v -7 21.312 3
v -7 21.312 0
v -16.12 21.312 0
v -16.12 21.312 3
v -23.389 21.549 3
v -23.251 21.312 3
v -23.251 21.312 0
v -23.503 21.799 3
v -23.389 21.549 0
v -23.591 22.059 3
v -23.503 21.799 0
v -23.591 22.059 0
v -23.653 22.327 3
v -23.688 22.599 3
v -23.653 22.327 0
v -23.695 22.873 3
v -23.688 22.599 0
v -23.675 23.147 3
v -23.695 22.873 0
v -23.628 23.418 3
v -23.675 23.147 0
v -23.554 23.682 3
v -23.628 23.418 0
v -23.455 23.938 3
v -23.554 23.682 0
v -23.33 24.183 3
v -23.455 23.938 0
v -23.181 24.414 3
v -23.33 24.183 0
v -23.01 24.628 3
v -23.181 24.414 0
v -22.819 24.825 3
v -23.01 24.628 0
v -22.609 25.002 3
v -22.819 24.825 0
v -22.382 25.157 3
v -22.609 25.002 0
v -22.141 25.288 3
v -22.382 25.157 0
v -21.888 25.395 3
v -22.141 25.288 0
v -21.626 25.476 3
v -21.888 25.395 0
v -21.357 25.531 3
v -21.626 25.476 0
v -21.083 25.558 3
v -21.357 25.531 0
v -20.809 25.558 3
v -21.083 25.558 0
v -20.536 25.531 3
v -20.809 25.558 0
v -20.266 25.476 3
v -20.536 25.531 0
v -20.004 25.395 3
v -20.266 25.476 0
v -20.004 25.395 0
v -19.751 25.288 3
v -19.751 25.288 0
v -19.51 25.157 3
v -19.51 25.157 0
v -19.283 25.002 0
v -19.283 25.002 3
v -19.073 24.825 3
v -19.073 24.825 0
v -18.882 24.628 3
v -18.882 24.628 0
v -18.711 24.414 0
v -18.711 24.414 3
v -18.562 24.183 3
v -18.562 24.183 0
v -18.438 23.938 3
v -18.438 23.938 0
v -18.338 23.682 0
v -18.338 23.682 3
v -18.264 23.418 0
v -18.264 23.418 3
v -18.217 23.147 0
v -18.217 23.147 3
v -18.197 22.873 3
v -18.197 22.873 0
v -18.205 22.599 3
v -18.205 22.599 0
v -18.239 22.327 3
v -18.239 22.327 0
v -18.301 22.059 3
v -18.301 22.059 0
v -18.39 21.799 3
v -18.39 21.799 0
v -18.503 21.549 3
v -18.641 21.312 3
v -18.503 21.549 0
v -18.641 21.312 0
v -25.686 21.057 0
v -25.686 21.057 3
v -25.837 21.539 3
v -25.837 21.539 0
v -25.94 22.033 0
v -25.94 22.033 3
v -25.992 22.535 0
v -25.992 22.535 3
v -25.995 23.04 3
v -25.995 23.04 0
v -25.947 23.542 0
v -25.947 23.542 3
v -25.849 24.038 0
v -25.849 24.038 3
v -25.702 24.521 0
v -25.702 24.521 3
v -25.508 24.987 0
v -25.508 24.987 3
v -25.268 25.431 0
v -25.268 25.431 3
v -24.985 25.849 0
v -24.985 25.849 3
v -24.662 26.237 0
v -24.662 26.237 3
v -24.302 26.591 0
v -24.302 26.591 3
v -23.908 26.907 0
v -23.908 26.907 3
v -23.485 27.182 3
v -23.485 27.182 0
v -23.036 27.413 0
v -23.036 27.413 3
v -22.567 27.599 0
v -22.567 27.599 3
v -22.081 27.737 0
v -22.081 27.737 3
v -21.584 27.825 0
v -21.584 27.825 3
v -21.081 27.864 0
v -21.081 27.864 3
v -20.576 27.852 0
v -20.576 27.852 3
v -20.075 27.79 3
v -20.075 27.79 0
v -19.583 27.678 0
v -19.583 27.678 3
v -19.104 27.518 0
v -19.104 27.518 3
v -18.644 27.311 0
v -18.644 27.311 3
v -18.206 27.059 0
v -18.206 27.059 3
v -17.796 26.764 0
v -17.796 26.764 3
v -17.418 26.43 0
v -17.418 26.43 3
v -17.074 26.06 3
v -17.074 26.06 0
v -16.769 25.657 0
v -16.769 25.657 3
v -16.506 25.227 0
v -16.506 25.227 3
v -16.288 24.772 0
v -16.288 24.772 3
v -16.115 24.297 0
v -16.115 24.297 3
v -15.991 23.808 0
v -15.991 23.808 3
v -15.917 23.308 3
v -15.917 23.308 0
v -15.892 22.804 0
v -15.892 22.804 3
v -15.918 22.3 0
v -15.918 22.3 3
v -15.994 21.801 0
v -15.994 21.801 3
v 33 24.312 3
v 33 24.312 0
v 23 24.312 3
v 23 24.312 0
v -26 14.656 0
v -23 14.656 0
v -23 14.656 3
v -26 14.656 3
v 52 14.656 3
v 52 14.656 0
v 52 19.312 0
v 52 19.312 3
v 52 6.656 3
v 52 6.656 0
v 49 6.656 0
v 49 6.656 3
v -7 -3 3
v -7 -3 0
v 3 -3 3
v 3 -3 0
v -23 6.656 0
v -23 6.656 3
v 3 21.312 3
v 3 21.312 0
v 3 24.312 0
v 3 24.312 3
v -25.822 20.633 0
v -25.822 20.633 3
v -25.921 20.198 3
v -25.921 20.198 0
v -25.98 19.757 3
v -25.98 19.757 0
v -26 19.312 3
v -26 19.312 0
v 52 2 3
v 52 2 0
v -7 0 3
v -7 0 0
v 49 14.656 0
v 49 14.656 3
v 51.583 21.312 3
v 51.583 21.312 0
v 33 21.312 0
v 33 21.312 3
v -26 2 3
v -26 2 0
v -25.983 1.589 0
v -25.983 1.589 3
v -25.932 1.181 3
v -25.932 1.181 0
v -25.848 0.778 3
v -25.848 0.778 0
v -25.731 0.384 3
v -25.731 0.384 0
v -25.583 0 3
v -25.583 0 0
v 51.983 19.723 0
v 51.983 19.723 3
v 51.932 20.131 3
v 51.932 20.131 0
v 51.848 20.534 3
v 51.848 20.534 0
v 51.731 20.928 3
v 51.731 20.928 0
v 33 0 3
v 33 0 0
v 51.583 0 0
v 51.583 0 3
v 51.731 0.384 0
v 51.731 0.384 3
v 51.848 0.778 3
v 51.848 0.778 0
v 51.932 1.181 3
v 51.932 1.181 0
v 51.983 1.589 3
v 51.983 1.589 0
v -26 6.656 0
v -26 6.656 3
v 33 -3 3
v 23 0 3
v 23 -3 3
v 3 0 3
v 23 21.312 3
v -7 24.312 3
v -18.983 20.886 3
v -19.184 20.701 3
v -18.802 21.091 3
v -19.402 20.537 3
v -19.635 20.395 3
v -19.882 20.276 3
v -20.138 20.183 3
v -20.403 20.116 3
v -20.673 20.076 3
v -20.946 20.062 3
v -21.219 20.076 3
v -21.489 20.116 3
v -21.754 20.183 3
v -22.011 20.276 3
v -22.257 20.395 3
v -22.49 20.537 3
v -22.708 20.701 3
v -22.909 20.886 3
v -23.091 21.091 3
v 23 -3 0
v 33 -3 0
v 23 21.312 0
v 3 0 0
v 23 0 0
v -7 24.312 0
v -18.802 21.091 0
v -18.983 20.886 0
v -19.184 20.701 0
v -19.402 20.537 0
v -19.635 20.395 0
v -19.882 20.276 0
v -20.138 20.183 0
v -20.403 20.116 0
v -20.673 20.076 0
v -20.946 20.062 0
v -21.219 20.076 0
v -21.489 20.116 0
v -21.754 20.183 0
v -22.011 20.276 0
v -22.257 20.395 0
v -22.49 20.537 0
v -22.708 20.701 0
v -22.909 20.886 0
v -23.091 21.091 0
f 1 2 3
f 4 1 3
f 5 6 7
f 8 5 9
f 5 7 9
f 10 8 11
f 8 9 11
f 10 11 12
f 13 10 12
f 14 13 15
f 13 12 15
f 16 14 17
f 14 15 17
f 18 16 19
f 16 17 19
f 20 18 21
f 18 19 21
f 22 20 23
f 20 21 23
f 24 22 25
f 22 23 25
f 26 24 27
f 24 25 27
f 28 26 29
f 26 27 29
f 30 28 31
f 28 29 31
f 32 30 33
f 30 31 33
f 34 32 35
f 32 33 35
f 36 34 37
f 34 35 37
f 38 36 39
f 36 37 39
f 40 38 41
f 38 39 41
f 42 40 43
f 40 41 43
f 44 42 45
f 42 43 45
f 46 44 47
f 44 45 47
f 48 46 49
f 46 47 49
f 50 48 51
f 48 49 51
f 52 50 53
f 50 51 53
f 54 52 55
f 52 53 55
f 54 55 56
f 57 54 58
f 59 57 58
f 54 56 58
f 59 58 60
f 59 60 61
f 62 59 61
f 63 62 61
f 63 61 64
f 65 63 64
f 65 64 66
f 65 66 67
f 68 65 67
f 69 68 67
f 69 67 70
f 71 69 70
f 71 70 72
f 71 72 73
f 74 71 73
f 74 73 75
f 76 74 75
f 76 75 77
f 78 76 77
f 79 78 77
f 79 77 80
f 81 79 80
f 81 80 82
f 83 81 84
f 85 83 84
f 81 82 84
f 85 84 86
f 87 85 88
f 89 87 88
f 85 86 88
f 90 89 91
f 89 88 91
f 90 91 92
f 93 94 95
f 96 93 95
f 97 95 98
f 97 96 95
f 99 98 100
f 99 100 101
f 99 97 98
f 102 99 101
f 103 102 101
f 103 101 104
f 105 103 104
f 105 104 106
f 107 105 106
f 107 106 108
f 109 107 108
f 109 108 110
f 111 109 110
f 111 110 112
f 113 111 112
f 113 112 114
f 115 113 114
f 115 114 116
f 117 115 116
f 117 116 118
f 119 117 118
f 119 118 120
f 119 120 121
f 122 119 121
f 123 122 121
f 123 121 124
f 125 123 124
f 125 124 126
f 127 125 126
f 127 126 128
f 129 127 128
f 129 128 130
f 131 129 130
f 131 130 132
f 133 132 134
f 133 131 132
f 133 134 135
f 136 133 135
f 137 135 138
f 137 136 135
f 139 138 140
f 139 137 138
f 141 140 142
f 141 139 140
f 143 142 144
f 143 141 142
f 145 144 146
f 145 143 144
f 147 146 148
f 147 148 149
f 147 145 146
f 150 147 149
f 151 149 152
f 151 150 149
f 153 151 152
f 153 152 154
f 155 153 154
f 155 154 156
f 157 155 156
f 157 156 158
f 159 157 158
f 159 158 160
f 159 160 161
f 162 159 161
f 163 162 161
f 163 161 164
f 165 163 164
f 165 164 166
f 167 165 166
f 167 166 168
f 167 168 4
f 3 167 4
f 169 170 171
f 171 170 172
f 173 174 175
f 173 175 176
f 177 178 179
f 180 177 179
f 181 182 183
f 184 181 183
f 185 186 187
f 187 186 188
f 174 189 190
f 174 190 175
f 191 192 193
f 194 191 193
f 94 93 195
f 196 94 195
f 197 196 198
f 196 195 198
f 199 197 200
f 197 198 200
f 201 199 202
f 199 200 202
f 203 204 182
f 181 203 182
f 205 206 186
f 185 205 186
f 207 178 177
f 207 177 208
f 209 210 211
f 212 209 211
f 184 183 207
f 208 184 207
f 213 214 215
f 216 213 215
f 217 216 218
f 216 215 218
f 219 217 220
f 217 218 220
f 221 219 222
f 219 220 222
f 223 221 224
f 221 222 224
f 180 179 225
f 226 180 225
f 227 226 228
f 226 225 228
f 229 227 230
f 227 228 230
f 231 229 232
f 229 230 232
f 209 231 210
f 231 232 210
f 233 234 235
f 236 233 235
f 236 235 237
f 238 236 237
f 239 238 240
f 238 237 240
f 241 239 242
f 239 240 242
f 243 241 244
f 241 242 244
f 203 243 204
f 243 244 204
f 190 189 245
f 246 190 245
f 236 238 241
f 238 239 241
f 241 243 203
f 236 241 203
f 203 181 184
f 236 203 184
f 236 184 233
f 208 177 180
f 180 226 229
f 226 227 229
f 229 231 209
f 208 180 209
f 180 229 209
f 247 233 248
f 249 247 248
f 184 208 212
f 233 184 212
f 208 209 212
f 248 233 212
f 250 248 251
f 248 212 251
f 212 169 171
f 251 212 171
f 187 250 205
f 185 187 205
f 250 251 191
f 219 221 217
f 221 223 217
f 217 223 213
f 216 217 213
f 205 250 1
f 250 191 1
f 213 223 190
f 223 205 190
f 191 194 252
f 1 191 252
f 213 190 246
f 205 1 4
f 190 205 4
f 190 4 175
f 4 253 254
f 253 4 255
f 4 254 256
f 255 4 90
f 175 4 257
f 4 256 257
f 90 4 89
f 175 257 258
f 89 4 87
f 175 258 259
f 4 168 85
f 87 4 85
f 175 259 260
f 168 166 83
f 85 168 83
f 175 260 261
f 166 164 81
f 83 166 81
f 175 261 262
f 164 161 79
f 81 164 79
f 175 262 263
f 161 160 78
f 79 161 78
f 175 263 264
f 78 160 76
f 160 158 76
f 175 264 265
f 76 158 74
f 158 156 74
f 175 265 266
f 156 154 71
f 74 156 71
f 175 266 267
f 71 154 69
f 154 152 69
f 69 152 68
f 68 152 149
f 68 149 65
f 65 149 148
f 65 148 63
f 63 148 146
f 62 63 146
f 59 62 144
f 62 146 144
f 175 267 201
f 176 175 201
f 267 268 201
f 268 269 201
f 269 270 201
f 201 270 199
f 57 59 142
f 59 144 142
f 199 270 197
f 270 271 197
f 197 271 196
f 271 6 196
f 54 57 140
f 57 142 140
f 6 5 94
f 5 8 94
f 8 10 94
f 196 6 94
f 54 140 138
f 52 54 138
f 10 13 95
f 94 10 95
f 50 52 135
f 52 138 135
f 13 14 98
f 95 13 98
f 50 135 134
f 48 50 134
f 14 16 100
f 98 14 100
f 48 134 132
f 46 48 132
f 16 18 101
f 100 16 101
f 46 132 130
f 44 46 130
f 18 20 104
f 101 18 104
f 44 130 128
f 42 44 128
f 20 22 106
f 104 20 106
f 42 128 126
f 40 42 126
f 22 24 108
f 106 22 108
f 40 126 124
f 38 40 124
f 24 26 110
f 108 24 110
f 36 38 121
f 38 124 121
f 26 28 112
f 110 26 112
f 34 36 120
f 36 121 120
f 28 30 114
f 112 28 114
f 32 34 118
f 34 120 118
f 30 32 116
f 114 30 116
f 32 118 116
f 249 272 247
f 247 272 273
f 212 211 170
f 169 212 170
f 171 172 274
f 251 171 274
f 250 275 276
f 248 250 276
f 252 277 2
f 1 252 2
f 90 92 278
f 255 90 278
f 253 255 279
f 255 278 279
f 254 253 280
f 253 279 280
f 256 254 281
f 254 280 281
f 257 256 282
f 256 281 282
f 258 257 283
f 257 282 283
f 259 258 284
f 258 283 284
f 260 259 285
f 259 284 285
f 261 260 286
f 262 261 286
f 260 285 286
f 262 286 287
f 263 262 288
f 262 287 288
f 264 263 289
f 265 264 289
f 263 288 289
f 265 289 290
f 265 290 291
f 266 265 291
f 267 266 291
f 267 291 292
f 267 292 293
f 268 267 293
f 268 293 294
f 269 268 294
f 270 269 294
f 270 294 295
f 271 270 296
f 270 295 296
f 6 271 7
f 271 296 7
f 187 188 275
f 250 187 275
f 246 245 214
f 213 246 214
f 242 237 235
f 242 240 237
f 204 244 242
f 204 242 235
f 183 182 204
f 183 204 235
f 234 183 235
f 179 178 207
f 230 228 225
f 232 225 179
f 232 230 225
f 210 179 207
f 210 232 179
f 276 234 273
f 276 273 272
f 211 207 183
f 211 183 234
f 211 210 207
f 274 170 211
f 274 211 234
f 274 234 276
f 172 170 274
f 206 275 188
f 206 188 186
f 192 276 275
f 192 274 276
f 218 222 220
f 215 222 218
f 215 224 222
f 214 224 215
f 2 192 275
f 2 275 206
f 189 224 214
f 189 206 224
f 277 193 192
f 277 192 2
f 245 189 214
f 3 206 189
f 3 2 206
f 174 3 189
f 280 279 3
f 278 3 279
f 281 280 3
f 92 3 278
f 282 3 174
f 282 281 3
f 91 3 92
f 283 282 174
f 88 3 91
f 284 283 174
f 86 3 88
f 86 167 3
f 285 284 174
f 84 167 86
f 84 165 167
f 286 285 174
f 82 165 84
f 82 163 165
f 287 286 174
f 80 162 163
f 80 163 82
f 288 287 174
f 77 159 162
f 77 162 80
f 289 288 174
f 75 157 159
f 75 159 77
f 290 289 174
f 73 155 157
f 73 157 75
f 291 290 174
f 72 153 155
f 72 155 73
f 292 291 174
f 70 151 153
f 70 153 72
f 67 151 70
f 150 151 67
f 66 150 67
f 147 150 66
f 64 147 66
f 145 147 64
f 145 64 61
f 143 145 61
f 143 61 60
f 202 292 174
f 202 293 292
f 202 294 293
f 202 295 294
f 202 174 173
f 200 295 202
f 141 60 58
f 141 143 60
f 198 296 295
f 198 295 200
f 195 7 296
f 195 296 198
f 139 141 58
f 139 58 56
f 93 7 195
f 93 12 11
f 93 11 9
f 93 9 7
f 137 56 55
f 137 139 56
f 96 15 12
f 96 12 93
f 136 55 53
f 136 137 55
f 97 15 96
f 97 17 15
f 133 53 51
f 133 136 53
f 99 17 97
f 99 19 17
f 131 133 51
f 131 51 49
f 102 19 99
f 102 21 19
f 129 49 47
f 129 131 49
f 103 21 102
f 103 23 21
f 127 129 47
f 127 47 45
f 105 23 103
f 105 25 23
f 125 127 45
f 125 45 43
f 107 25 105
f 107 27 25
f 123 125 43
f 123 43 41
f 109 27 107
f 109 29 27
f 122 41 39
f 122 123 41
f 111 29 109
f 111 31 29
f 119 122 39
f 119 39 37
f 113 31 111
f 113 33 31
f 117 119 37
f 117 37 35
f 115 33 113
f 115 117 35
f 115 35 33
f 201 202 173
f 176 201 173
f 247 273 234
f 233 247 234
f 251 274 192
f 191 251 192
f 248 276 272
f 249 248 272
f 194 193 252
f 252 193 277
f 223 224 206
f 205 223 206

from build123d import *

# Parameters (mm, degrees)
BOSS_EXTRUDE1_DEPTH = 3
SKETCH3_R           = 5.053902861
SKETCH3_R_2         = 2.749769833
BOSS_EXTRUDE3_DEPTH = 3
CUT_EXTRUDE1_DEPTH  = 3
SKETCH5_W           = 3
SKETCH5_H           = 8
CUT_EXTRUDE2_DEPTH  = 3


with BuildPart() as part:
    # Sketch1 → Boss-Extrude1 (new body)
    with BuildSketch(Plane.XY):
        with BuildLine():
            Line((-7, -3), (3, -3))
            Line((3, -3), (3, 0))
            Line((3, 0), (23, 0))
            Line((23, 0), (23, -3))
            Line((23, -3), (33, -3))
            Line((33, -3), (33, 0))
            Line((33, 0), (51.582575695, 0))
            ThreePointArc((51.582575695, 0), (51.894531565, 0.978451782), (52, 2))
            Line((52, 2), (52, 19.311841589))
            ThreePointArc((52, 19.311841589), (51.894531565, 20.333389808), (51.582575695, 21.311841589))
            Line((51.582575695, 21.311841589), (33, 21.311841589))
            Line((33, 21.311841589), (33, 24.311841589))
            Line((33, 24.311841589), (23, 24.311841589))
            Line((23, 24.311841589), (23, 21.311841589))
            Line((23, 21.311841589), (3, 21.311841589))
            Line((3, 21.311841589), (3, 24.311841589))
            Line((3, 24.311841589), (-7, 24.311841589))
            Line((-7, 24.311841589), (-7, 21.311841589))
            Line((-7, 21.311841589), (-25.582575695, 21.311841589))
            ThreePointArc((-25.582575695, 21.311841589), (-25.894531565, 20.333389808), (-26, 19.311841589))
            Line((-26, 19.311841589), (-26, 2))
            ThreePointArc((-26, 2), (-25.894531565, 0.978451782), (-25.582575695, 0))
            Line((-25.582575695, 0), (-7, 0))
            Line((-7, 0), (-7, -3))
        make_face()
    extrude(amount=BOSS_EXTRUDE1_DEPTH)

    # Sketch3 → Boss-Extrude3 (add)
    with BuildSketch(Plane(origin=(0, 0, 0), x_dir=(-1, 0, 0), z_dir=(0, 0, -1))):
        with Locations((20.946097139, 22.811841589)):
            Circle(SKETCH3_R)
        with Locations((20.946097139, 22.811841589)):
            Circle(SKETCH3_R_2, mode=Mode.SUBTRACT)
    extrude(amount=-BOSS_EXTRUDE3_DEPTH)

    # Sketch4 → Cut-Extrude1 (cut)
    with BuildSketch(Plane(origin=(0, 0, 0), x_dir=(-1, 0, 0), z_dir=(0, 0, -1))):
        with BuildLine():
            Line((23.250708633, 21.311841589), (18.641485645, 21.311841589))
            ThreePointArc((18.641485645, 21.311841589), (20.946097139, 20.062071756), (23.250708633, 21.311841589))
        make_face()
    extrude(amount=-CUT_EXTRUDE1_DEPTH, mode=Mode.SUBTRACT)

    # Sketch5 → Cut-Extrude2 (cut)
    with BuildSketch(Plane(origin=(0, 0, 0), x_dir=(-1, 0, 0), z_dir=(0, 0, -1))):
        with Locations((24.5, 10.655920795)):
            Rectangle(SKETCH5_W, SKETCH5_H)
        with Locations((-50.5, 10.655920795)):
            Rectangle(SKETCH5_W, SKETCH5_H)
    extrude(amount=-CUT_EXTRUDE2_DEPTH, mode=Mode.SUBTRACT)


solid = part.part
